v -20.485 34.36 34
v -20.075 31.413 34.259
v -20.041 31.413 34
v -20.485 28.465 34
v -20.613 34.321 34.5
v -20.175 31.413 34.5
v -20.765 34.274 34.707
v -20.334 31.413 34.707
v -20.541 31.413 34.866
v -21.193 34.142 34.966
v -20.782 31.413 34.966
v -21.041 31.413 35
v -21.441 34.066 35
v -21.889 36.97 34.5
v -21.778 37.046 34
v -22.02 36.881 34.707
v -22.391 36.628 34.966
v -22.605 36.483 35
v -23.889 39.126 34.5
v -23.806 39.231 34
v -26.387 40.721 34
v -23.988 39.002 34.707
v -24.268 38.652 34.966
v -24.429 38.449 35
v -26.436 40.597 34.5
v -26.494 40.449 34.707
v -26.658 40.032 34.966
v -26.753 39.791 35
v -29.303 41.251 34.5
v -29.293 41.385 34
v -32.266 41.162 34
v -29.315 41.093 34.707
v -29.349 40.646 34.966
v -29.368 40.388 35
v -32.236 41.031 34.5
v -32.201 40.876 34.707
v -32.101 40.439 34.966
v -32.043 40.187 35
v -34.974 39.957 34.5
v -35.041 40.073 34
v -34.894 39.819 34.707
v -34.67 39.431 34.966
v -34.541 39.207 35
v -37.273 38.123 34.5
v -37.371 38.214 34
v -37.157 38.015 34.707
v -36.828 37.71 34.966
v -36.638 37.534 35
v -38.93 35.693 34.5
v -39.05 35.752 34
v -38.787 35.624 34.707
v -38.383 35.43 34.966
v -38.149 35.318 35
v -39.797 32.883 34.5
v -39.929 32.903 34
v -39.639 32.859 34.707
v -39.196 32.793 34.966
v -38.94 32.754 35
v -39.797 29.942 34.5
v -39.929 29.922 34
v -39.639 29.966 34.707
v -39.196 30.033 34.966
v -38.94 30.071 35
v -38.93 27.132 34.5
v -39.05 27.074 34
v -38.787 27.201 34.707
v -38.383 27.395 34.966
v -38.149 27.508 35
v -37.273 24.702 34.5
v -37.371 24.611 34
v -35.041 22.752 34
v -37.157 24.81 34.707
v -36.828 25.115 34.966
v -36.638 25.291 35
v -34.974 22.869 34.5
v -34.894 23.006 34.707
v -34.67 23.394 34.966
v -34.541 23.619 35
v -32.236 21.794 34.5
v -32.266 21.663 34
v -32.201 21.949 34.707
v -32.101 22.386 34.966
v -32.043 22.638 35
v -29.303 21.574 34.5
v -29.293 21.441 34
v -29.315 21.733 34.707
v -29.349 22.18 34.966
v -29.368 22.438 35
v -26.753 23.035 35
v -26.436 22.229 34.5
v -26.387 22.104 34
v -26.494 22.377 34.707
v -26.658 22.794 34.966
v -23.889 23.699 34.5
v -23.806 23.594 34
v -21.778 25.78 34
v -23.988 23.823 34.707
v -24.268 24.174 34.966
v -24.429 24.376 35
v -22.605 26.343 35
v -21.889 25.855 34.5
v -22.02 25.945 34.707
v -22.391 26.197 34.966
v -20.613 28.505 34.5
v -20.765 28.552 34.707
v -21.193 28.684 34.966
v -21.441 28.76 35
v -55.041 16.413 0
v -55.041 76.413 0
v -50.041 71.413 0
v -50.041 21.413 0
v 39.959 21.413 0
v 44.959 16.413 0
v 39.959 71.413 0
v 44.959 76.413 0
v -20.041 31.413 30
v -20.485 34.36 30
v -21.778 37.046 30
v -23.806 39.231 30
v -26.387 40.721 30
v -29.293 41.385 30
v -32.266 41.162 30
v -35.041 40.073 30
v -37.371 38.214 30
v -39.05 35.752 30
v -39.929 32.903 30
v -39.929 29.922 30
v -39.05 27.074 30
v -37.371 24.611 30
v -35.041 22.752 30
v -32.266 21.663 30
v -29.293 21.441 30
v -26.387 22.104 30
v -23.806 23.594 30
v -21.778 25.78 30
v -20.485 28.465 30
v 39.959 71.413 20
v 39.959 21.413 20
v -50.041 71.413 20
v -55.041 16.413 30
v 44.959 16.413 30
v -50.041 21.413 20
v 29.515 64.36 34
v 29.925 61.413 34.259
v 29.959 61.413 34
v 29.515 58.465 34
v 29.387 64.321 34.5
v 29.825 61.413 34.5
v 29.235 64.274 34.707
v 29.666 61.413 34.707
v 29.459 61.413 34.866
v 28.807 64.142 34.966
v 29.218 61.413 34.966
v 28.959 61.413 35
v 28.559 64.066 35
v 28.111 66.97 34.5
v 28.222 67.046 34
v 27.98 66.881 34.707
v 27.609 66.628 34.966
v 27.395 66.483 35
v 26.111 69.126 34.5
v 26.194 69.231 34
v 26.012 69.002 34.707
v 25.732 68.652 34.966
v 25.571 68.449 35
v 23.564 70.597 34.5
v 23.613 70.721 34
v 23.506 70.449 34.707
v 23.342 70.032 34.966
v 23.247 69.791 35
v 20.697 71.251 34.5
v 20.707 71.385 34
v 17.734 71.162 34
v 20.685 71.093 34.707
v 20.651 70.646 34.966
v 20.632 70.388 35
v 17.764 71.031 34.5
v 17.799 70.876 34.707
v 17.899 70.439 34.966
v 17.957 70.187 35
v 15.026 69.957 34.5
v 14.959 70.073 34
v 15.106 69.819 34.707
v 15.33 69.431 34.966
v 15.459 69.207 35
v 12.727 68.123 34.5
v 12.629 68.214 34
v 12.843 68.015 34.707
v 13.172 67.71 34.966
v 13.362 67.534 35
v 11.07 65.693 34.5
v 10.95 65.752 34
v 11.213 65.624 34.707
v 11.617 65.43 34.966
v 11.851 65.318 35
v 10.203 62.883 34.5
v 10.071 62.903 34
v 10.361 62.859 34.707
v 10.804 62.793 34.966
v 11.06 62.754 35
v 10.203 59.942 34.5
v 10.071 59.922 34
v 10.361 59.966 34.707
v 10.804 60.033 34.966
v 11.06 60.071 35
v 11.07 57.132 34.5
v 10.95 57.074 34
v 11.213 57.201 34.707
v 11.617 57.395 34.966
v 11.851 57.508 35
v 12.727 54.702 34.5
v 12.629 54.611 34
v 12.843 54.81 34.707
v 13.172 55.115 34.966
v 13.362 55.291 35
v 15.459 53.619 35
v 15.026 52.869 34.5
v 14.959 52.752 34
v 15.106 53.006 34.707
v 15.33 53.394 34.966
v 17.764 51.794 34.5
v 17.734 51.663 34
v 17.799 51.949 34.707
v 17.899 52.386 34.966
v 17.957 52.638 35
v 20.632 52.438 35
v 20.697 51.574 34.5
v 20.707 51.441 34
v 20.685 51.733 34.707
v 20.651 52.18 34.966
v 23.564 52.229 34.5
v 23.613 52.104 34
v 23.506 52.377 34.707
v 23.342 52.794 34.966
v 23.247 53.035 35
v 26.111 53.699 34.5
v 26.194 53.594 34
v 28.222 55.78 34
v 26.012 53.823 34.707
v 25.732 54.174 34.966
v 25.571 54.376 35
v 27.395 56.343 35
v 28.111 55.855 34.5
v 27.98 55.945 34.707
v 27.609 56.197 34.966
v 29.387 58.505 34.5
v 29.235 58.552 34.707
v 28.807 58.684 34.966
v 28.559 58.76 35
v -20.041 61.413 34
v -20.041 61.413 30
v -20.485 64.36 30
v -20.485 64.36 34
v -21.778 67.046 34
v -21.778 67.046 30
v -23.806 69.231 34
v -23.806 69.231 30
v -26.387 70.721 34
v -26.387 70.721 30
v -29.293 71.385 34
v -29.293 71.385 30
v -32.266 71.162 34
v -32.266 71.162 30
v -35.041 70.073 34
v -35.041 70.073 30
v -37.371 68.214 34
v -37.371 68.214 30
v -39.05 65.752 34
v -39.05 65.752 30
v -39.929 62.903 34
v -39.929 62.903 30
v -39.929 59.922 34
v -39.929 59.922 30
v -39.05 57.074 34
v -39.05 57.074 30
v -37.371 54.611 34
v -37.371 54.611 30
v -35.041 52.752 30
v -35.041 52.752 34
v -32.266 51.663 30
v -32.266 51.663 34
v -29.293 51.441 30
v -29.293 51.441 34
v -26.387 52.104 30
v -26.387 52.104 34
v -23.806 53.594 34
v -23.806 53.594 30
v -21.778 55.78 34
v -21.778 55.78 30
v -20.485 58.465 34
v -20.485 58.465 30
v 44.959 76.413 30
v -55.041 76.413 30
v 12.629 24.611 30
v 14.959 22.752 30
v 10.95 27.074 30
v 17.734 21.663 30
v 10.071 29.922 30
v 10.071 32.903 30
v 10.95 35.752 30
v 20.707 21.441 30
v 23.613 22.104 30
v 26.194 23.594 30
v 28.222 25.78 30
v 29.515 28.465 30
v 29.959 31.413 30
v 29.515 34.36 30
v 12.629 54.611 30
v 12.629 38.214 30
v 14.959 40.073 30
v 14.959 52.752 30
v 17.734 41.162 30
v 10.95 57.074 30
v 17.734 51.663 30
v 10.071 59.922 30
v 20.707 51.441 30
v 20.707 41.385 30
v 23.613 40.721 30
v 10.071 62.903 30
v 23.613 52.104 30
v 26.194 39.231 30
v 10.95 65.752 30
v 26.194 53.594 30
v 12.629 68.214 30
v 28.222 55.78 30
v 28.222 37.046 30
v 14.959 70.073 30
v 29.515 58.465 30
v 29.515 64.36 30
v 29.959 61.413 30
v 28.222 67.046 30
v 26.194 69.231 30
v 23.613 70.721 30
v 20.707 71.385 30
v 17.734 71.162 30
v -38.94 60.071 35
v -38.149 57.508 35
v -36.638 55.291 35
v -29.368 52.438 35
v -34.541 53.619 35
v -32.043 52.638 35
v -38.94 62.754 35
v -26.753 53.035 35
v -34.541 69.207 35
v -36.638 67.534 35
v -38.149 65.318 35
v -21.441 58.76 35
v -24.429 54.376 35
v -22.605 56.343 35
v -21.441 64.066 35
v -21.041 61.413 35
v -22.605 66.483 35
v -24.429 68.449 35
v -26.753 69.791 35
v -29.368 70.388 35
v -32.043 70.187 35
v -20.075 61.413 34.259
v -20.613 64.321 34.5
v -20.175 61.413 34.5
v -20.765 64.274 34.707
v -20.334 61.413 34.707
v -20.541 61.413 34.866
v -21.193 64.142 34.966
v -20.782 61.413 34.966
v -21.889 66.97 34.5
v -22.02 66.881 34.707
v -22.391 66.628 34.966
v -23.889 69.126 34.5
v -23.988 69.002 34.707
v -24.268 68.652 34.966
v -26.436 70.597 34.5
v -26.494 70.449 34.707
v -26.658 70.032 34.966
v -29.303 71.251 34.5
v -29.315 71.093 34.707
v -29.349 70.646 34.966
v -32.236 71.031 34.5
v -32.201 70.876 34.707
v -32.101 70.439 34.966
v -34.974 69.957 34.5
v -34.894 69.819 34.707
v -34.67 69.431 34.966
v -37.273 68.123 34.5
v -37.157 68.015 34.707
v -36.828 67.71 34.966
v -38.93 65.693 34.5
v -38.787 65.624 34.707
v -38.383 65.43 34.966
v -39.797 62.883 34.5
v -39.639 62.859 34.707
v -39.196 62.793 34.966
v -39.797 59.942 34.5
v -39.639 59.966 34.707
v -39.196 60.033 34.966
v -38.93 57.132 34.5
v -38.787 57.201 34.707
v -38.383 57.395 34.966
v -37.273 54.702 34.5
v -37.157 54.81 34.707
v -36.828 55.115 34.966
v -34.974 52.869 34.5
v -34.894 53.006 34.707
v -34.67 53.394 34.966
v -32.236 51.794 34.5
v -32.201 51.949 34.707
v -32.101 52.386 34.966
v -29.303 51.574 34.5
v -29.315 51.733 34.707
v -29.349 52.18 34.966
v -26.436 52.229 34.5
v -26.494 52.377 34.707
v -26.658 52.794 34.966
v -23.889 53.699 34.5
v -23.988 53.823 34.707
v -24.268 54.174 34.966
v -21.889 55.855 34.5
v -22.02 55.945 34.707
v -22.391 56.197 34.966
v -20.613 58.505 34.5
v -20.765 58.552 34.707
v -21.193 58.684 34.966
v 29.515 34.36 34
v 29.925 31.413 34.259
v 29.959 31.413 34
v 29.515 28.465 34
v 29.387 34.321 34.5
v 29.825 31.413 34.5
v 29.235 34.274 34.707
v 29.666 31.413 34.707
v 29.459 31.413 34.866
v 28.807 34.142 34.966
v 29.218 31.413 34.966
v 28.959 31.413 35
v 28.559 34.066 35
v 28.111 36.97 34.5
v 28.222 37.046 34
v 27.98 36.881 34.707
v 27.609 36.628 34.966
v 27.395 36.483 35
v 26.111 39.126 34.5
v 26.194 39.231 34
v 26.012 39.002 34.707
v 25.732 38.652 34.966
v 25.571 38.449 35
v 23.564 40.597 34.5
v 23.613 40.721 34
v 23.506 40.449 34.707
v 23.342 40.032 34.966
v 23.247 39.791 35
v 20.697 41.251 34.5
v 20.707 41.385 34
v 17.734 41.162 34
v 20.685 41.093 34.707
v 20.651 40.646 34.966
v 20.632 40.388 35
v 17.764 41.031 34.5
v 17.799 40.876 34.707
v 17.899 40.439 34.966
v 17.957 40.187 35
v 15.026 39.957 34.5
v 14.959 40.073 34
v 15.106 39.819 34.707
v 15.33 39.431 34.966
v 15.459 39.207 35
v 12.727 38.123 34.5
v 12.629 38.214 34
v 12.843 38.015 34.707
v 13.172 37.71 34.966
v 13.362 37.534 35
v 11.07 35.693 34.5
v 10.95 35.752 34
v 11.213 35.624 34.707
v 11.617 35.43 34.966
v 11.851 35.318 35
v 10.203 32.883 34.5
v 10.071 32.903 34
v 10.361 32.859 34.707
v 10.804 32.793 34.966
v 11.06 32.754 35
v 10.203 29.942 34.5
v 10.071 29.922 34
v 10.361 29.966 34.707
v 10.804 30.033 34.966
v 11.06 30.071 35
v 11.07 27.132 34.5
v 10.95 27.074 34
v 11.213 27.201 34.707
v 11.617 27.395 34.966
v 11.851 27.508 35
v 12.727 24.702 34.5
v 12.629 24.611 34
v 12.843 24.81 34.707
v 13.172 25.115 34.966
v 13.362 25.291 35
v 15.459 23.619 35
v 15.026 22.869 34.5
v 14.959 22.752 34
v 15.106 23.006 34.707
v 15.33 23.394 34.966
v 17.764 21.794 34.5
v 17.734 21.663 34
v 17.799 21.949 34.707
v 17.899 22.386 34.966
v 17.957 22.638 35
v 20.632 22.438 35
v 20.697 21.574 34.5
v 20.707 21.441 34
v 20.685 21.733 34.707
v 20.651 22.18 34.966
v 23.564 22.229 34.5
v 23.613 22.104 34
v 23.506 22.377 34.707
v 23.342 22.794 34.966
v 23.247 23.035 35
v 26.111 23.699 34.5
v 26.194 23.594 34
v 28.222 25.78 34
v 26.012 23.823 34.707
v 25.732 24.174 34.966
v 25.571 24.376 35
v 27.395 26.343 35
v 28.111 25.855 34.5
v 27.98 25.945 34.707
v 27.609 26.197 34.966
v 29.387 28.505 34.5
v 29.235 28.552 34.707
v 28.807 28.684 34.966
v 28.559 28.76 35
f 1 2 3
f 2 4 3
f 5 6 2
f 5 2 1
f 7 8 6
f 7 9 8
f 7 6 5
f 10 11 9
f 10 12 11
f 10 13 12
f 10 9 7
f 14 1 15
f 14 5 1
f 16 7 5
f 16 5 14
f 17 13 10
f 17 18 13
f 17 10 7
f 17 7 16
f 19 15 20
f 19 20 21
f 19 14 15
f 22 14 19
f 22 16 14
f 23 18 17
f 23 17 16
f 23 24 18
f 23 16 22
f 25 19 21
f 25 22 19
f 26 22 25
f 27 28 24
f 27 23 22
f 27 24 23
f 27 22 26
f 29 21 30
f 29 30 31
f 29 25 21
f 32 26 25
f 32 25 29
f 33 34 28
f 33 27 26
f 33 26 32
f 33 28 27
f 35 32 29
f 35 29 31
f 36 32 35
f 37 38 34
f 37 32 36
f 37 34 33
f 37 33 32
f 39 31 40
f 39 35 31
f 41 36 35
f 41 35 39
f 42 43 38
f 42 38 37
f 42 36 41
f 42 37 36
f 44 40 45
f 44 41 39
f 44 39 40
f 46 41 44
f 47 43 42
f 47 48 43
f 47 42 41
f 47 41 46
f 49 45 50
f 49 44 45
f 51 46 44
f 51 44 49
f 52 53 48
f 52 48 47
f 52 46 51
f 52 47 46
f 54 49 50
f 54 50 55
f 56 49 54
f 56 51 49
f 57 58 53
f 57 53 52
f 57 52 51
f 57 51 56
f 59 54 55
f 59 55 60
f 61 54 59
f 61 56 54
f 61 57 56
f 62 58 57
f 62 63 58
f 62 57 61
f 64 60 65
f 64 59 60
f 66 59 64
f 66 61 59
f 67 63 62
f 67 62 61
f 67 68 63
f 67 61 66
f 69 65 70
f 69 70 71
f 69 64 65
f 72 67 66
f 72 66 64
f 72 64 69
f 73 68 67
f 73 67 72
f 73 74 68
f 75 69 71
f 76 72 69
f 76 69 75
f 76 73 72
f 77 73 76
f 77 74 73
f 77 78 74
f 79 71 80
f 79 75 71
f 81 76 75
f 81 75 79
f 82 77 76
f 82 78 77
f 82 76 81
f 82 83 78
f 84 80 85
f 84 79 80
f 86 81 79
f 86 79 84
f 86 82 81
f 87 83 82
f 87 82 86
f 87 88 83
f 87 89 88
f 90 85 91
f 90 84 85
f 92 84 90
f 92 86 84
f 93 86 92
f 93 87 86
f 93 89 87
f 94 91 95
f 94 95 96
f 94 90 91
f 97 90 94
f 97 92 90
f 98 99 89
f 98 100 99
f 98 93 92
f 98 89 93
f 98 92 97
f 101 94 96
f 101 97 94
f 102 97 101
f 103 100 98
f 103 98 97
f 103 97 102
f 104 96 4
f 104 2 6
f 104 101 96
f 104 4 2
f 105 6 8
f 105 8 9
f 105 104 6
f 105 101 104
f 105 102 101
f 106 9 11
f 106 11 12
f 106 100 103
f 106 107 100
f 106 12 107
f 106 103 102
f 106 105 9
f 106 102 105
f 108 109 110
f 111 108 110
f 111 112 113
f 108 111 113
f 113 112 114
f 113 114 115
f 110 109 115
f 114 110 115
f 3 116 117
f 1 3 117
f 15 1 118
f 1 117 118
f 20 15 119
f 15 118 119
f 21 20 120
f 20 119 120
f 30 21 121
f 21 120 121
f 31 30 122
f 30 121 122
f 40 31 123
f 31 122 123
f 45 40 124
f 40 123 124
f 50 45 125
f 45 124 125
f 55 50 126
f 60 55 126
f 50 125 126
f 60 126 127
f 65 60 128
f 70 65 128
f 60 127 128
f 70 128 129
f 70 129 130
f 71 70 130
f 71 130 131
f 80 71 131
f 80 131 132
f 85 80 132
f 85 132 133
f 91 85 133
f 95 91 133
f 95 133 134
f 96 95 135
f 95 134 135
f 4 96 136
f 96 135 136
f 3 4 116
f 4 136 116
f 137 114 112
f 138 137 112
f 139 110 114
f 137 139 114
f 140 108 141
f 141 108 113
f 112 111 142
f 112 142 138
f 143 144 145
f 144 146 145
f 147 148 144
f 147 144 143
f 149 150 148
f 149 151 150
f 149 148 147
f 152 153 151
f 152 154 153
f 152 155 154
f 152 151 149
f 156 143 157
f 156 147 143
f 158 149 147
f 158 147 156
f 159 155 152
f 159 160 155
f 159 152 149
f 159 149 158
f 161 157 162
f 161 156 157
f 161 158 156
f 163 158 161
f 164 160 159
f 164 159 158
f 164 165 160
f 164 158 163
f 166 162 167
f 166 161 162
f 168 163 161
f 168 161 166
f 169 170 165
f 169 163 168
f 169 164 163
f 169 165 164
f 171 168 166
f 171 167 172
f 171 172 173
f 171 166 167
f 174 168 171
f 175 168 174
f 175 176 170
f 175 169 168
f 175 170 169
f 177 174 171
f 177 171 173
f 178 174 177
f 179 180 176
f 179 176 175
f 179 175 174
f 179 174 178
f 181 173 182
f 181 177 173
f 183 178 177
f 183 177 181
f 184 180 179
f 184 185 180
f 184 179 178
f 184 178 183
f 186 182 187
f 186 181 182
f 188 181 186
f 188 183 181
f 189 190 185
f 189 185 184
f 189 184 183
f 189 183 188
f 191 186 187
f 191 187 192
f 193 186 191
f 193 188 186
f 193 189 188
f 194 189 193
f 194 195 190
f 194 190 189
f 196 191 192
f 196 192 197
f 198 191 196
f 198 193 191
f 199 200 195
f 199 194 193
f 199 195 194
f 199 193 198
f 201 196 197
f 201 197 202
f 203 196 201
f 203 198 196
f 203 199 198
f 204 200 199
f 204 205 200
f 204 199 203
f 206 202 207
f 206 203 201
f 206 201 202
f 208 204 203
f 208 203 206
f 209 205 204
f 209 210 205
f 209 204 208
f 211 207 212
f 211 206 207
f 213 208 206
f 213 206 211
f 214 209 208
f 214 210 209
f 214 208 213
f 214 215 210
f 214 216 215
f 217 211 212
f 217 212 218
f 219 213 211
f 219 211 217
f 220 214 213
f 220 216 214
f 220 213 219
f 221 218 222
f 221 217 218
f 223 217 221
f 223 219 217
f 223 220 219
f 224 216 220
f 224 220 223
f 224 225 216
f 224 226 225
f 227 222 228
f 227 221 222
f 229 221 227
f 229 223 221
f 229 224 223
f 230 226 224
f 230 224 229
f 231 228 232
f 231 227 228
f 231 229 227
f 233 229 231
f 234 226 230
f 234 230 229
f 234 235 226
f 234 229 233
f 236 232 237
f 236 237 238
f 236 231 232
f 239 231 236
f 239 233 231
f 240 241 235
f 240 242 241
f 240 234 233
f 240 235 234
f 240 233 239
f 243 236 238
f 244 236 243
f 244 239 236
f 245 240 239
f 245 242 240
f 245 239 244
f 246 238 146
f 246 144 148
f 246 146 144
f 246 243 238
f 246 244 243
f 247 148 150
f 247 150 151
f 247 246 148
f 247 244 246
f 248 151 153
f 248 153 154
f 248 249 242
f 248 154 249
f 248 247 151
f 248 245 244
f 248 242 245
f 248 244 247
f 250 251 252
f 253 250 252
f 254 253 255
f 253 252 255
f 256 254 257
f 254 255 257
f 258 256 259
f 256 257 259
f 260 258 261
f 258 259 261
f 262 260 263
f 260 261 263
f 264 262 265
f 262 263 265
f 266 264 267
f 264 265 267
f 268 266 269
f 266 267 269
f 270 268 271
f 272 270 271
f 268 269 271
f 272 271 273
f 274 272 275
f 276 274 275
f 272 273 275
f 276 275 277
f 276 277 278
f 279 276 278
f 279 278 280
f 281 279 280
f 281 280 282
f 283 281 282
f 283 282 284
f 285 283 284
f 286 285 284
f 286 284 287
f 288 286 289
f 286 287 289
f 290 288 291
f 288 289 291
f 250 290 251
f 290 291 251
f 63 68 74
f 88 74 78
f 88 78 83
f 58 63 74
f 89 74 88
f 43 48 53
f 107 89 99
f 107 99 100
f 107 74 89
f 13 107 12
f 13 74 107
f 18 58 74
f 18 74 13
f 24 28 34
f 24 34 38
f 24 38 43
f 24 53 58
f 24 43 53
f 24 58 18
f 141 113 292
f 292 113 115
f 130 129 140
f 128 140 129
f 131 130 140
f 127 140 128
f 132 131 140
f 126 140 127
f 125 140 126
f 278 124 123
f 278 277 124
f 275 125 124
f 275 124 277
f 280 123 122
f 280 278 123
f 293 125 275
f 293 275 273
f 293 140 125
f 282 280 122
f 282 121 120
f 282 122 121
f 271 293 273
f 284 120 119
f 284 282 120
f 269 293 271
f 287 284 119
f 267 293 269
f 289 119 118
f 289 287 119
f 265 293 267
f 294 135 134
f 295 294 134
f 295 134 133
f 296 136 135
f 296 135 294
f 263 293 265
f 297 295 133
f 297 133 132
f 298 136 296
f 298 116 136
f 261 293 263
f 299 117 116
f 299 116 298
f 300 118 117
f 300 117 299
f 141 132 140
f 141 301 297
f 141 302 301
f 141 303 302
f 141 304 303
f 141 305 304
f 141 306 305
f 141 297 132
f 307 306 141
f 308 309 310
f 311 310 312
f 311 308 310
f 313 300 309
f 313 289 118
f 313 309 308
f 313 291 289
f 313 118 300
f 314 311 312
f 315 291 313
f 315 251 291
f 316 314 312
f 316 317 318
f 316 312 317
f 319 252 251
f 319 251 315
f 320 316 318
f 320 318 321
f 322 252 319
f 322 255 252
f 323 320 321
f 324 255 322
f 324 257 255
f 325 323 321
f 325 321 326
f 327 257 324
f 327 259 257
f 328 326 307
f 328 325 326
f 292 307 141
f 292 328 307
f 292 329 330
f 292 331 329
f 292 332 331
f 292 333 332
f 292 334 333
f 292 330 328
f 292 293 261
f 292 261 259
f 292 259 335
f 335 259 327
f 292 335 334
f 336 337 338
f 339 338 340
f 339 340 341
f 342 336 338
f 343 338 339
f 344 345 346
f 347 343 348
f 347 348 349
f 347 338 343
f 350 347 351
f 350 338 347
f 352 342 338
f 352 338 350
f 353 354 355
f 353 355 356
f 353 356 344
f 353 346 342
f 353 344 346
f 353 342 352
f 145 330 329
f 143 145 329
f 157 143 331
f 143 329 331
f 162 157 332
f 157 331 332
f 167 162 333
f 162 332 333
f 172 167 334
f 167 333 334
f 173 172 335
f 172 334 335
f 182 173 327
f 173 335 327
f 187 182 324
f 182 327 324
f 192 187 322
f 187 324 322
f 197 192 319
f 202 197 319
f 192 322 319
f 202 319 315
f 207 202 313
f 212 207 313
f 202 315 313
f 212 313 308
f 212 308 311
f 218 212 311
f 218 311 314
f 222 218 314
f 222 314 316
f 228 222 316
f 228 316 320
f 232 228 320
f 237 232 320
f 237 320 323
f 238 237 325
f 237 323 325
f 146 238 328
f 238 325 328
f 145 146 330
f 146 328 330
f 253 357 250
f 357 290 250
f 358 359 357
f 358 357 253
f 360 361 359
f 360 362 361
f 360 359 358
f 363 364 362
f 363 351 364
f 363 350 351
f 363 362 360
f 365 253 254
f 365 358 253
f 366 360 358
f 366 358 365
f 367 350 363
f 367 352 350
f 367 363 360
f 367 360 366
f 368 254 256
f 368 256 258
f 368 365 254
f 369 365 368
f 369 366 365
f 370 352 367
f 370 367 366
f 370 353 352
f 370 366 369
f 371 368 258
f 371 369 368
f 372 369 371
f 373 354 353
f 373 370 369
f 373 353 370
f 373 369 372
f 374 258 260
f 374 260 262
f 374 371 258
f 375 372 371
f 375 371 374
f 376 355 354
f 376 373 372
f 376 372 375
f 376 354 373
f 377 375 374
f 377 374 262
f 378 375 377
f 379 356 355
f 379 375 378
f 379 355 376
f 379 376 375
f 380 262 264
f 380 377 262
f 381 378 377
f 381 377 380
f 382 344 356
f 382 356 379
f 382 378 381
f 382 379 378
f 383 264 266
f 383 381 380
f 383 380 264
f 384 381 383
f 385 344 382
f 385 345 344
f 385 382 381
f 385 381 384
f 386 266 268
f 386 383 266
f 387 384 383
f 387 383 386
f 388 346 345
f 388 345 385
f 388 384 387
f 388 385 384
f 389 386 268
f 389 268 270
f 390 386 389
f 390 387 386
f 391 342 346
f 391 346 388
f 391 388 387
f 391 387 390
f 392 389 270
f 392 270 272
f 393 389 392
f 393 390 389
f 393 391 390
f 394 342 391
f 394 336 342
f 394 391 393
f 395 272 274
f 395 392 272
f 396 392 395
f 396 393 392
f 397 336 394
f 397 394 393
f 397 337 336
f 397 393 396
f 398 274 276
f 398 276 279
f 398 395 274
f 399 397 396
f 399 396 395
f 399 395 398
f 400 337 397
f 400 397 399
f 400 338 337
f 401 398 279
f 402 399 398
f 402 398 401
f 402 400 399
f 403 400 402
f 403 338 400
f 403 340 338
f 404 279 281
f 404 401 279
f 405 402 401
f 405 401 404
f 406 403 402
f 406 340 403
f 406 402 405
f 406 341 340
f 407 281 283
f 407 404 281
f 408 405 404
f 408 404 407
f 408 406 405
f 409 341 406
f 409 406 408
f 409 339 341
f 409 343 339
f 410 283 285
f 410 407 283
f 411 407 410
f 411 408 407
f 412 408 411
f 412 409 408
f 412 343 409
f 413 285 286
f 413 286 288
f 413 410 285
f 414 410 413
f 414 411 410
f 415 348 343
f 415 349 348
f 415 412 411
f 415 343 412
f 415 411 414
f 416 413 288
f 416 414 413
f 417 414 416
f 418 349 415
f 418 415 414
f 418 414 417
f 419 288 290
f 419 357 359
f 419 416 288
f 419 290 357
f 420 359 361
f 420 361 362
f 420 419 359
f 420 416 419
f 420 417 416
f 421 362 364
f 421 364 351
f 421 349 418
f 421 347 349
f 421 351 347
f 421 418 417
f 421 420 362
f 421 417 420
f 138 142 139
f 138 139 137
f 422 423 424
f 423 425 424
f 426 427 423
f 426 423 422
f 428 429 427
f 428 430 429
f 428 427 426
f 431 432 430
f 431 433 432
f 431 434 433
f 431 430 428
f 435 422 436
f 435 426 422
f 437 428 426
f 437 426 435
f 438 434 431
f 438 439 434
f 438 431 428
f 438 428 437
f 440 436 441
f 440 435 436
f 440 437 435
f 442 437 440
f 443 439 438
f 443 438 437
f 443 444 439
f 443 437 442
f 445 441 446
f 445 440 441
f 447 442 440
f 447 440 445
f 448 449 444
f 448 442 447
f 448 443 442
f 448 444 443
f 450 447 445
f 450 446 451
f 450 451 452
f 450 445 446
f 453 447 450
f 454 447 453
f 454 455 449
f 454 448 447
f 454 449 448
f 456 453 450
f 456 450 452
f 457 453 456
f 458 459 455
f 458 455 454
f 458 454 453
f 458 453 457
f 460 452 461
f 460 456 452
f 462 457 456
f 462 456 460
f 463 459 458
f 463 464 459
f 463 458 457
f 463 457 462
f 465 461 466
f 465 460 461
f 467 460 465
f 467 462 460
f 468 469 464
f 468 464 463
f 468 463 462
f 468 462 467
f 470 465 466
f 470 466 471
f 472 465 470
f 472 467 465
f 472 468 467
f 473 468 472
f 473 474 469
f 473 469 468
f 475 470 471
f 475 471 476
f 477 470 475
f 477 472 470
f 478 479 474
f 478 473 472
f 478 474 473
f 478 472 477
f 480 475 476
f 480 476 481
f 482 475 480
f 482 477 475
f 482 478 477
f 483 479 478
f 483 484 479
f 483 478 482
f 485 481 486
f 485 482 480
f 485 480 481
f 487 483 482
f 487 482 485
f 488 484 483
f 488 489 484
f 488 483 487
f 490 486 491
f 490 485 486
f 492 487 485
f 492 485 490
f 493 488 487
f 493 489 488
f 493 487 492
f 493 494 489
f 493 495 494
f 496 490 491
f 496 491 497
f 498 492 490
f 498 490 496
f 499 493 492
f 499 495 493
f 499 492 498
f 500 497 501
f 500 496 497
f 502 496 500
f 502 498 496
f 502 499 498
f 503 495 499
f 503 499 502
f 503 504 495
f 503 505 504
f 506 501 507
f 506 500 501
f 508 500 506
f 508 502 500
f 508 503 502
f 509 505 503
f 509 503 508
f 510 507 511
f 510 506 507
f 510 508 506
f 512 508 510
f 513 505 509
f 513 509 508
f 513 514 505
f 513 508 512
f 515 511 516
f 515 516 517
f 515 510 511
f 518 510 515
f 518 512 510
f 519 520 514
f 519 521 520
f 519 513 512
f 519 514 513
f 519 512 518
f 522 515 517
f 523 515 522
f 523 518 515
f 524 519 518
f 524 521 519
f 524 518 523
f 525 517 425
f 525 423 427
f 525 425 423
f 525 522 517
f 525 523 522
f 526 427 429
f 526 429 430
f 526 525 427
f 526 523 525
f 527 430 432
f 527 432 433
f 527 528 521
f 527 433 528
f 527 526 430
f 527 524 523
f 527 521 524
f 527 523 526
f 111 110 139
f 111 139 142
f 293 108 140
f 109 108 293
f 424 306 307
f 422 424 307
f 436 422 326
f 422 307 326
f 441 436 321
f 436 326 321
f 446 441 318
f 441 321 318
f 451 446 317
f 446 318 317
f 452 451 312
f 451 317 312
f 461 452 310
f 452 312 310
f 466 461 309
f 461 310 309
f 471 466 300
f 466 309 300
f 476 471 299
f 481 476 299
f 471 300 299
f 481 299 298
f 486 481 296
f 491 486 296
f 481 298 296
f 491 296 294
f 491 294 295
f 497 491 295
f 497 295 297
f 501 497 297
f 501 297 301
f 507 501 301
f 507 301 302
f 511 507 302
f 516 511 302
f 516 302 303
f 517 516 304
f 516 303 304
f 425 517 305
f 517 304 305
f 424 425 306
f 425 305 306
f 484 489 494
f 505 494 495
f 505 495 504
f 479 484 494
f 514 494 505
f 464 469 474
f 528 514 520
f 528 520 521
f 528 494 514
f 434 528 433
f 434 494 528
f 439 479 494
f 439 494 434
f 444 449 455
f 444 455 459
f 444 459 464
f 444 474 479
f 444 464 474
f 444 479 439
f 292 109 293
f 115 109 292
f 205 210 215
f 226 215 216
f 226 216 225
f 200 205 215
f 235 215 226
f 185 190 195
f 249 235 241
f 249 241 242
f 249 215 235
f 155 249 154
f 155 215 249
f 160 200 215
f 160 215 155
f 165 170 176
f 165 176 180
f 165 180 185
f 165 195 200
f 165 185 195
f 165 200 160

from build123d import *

# Parameters (mm, degrees)
F0_W     = 100
F0_H     = 60
F1_DEPTH = 30
F2_W     = 90.000001
F2_H     = 50.000001
F3_DEPTH = 20
F4_R     = 10
F5_DEPTH = 5
F6_R     = 1


with BuildPart() as f1:
    # F0 (on Top) → F1 (new body)
    with BuildSketch(Plane.XY):
        with Locations((-5.040722, 46.412729)):
            Rectangle(F0_W, F0_H)
    extrude(amount=F1_DEPTH)

    # F2 (on face) → F3 (cut)
    with BuildSketch(Plane(origin=(0, 0, 0), x_dir=(1, 0, 0), z_dir=(0, 0, -1))):
        with Locations((-5.040722, -46.412729)):
            Rectangle(F2_W, F2_H)
    extrude(amount=-F3_DEPTH, mode=Mode.SUBTRACT)

    # F4 (on face) → F5 (join)
    with BuildSketch(Plane.XY.offset(30)):
        with Locations((-30.040722, 61.412729)):
            Circle(F4_R)
        with Locations((-30.040722, 31.412729)):
            Circle(F4_R)
        with Locations((19.959278, 61.412729)):
            Circle(F4_R)
        with Locations((19.959278, 31.412729)):
            Circle(F4_R)
    extrude(amount=F5_DEPTH)

    # F6
    f6_edges = [f1.edges().sort_by_distance(p)[0] for p in [
        (-40.040722, 61.412729, 35),
        (9.959278, 61.412729, 35),
        (9.959278, 31.412729, 35),
        (-40.040722, 31.412729, 35),
    ]]
    fillet(f6_edges, radius=F6_R)


solid = f1.part
